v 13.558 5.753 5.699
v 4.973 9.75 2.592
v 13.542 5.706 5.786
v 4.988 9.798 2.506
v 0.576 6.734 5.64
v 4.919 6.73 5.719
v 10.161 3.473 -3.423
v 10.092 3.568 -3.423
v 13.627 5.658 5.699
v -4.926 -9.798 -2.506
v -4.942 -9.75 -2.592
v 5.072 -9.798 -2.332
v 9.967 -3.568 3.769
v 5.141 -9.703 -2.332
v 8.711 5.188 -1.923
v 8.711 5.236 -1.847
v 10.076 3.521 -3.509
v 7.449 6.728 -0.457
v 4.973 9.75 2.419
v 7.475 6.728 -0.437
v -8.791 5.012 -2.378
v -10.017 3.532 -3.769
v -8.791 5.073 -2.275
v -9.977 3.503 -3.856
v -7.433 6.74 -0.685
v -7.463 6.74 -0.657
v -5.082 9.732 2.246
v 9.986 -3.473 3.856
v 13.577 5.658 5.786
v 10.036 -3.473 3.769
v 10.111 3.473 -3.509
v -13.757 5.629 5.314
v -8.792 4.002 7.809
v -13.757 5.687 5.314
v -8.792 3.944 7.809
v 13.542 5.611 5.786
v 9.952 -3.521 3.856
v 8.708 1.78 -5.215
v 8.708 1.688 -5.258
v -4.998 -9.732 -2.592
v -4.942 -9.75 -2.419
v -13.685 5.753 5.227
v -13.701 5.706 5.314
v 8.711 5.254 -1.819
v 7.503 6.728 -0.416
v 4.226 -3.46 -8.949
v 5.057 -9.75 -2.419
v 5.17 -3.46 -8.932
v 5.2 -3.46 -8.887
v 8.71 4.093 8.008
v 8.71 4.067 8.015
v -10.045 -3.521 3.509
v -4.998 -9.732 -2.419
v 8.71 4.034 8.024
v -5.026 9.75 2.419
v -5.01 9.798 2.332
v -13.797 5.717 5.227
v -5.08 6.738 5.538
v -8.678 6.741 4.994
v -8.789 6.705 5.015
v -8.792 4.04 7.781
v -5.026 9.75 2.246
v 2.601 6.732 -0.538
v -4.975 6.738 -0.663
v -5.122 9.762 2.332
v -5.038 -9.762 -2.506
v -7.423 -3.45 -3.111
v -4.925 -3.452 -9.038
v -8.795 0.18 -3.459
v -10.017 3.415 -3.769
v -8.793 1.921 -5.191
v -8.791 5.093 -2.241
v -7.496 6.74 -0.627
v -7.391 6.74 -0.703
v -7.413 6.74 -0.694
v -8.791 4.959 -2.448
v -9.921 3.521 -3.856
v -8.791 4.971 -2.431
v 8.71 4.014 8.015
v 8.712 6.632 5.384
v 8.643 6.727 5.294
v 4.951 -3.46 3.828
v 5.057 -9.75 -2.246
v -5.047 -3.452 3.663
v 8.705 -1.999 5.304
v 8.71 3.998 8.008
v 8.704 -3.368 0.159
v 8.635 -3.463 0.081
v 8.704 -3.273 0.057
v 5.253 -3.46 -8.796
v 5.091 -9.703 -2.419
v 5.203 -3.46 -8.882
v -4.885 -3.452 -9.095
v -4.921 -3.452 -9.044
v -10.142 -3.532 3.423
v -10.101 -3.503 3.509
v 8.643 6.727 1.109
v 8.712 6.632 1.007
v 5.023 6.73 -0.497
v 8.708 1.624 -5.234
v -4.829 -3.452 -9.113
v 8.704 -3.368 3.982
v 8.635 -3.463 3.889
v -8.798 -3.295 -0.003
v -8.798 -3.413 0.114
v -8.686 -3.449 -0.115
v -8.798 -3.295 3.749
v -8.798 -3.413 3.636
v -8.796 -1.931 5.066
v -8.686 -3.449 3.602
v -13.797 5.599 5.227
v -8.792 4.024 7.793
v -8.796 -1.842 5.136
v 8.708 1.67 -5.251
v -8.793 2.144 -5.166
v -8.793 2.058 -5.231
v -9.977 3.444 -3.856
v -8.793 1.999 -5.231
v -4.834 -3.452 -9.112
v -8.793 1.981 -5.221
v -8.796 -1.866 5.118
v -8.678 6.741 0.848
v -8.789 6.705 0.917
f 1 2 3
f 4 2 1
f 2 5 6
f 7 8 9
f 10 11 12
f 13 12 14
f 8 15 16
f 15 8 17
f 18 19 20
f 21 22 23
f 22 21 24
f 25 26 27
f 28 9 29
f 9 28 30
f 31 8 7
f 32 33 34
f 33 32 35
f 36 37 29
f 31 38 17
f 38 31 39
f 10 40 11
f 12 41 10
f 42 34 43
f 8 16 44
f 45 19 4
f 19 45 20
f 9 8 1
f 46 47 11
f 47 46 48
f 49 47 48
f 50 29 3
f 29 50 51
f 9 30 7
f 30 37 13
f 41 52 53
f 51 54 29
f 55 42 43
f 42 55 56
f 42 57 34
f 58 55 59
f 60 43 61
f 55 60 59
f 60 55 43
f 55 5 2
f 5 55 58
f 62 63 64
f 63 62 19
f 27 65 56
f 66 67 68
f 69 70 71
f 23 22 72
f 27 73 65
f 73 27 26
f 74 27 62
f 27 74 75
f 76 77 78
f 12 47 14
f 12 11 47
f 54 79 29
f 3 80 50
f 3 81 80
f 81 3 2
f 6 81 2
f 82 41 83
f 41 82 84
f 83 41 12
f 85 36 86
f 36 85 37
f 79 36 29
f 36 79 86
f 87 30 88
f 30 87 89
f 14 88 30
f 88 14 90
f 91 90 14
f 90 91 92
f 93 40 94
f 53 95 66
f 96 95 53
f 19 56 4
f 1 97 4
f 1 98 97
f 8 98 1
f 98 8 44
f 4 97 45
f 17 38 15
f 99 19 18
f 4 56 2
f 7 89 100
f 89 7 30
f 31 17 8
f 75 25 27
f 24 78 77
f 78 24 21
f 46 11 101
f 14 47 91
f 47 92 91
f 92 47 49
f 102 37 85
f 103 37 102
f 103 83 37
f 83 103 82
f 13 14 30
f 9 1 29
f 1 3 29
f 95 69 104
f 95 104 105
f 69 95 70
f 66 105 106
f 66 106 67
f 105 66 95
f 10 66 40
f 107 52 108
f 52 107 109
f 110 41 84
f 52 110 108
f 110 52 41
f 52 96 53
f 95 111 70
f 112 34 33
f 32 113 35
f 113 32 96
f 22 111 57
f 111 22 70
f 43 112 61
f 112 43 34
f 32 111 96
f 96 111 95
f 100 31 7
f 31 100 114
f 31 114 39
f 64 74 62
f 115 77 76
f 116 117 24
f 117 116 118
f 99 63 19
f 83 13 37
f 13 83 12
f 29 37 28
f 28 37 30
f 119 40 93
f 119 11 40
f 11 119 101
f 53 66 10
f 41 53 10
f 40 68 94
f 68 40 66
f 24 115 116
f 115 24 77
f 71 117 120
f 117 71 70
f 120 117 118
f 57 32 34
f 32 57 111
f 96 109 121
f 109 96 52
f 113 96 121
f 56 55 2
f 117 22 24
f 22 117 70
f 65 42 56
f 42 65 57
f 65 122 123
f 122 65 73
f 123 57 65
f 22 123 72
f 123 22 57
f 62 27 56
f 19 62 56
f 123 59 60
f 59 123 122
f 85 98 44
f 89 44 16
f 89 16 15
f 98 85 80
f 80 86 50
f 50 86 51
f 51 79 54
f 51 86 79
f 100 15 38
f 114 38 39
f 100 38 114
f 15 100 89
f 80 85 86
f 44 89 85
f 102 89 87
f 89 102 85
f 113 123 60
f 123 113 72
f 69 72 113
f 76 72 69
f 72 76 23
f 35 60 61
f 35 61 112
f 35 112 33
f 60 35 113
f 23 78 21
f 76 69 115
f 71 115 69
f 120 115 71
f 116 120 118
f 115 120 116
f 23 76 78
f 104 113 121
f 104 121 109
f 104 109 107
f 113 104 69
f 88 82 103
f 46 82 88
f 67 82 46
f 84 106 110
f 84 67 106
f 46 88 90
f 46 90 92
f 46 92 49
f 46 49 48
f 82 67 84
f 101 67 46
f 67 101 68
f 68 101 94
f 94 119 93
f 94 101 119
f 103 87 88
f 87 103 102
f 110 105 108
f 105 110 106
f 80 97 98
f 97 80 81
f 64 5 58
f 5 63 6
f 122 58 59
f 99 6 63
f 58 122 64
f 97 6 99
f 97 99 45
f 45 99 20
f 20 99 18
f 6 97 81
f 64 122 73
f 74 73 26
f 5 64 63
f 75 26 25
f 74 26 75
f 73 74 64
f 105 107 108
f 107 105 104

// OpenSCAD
// Auto-generated OpenSCAD file

    inner_points = 10*[[-0.0056399232151652795, -0.3360917085536317, -0.9999999999999865], [-0.004821322839871758, 0.663907956393025, -1.0000000000000135], [-0.005639923215391682, -0.3360917085535774, 1.0000000000000135], [-0.004821322840098161, 0.6639079563930792, 0.9999999999999865], [-0.8716650368349537, -0.3353827798330664, -0.5000000000000846], [0.8603851904045097, -0.33680063727416976, -0.4999999999998884], [-0.8708464364596602, 0.6646168851135902, -0.5000000000001116], [0.8612037907798034, 0.6631990276724868, -0.49999999999991546], [-0.8716650368350669, -0.3353827798330393, 0.49999999999991546], [0.8603851904043966, -0.33680063727414267, 0.5000000000001116], [-0.8708464364597732, 0.6646168851136173, 0.4999999999998884], [0.8612037907796903, 0.6631990276725139, 0.5000000000000846], [-0.7917964519713716, 0.1645520072181886, -1.3623724356958835], [-0.7917964519716802, 0.16455200721826255, 1.3623724356957054]];

    outer_points = 10*[[-1.0060843799292358, -0.34733073917718565, 0.3422799703240538], [-0.9936151164744732, 0.34733073917718565, -0.3769487470944146], [0.9936151164744732, -0.34733073917718565, 0.3769487470944146], [1.0060843799292358, 0.34733073917718565, -0.3422799703240538], [-0.5165877783212961, 0.27563320269095287, 0.9524512611485145], [-0.49573123333532093, -0.9702946810453241, -0.2505569321152264], [-0.5041185148665335, 0.9702946810453241, 0.233222543730046], [-0.4832619698805584, -0.27563320269095287, -0.969785649533695], [0.4832619698805584, 0.27563320269095287, 0.969785649533695], [0.5041185148665335, -0.9702946810453241, -0.233222543730046], [0.49573123333532093, 0.9702946810453241, 0.2505569321152264], [0.5165877783212961, -0.27563320269095287, -0.9524512611485145], [-1.3716391974518345, 0.5658059352223662, 0.5226991745472914], [1.35269627612334, 0.5658059352223662, 0.5699309603985218]];

    // Convex hull for inner set (I)
    module inner_hull() {
        hull() {
            for (p = inner_points) {
                translate(p) sphere(r=0.1);
            }
        }
    }

    // Convex hull for outer set (O) minus inner hull (O \ I)
    module outer_minus_inner() {
        difference() {
            hull() {
                for (p = outer_points) {
                    translate(p) sphere(r=0.1);
                }
            }
            inner_hull(); // Subtract inner hull
        }
    }

    // Convex hull for outer set (O) minus all translated inner hulls
    module outer_minus_AllTranslationInner() {
        difference() {
            hull() {
                for (p = outer_points) {
                    translate(p) sphere(r=0.1);
                }
            }
            hull() {
                translate([0,0,50]) inner_hull();
                translate([0,0,-50]) inner_hull();
            }; // Subtract translated inner hulls
        }
    }

    // Difference between outer_minus_inner and outer_minus_AllTranslationInner
    module outer_minus_inner_diff() {
        difference() {
            // Outer minus inner
            difference() {
                hull() {
                    for (p = outer_points) {
                        translate(p) sphere(r=0.1);
                    }
                }
                inner_hull();
            }

            // Subtract Outer minus AllTranslationInner
            difference() {
                hull() {
                    for (p = outer_points) {
                        translate(p) sphere(r=0.1);
                    }
                }
                hull() {
                    translate([0,0,50]) inner_hull();
                    translate([0,0,-50]) inner_hull();
                };
            }
        }
    }

    // Rendering all with colors applied
    color([0, 1, 0, 1]) outer_minus_AllTranslationInner(); // Opaque green
    
